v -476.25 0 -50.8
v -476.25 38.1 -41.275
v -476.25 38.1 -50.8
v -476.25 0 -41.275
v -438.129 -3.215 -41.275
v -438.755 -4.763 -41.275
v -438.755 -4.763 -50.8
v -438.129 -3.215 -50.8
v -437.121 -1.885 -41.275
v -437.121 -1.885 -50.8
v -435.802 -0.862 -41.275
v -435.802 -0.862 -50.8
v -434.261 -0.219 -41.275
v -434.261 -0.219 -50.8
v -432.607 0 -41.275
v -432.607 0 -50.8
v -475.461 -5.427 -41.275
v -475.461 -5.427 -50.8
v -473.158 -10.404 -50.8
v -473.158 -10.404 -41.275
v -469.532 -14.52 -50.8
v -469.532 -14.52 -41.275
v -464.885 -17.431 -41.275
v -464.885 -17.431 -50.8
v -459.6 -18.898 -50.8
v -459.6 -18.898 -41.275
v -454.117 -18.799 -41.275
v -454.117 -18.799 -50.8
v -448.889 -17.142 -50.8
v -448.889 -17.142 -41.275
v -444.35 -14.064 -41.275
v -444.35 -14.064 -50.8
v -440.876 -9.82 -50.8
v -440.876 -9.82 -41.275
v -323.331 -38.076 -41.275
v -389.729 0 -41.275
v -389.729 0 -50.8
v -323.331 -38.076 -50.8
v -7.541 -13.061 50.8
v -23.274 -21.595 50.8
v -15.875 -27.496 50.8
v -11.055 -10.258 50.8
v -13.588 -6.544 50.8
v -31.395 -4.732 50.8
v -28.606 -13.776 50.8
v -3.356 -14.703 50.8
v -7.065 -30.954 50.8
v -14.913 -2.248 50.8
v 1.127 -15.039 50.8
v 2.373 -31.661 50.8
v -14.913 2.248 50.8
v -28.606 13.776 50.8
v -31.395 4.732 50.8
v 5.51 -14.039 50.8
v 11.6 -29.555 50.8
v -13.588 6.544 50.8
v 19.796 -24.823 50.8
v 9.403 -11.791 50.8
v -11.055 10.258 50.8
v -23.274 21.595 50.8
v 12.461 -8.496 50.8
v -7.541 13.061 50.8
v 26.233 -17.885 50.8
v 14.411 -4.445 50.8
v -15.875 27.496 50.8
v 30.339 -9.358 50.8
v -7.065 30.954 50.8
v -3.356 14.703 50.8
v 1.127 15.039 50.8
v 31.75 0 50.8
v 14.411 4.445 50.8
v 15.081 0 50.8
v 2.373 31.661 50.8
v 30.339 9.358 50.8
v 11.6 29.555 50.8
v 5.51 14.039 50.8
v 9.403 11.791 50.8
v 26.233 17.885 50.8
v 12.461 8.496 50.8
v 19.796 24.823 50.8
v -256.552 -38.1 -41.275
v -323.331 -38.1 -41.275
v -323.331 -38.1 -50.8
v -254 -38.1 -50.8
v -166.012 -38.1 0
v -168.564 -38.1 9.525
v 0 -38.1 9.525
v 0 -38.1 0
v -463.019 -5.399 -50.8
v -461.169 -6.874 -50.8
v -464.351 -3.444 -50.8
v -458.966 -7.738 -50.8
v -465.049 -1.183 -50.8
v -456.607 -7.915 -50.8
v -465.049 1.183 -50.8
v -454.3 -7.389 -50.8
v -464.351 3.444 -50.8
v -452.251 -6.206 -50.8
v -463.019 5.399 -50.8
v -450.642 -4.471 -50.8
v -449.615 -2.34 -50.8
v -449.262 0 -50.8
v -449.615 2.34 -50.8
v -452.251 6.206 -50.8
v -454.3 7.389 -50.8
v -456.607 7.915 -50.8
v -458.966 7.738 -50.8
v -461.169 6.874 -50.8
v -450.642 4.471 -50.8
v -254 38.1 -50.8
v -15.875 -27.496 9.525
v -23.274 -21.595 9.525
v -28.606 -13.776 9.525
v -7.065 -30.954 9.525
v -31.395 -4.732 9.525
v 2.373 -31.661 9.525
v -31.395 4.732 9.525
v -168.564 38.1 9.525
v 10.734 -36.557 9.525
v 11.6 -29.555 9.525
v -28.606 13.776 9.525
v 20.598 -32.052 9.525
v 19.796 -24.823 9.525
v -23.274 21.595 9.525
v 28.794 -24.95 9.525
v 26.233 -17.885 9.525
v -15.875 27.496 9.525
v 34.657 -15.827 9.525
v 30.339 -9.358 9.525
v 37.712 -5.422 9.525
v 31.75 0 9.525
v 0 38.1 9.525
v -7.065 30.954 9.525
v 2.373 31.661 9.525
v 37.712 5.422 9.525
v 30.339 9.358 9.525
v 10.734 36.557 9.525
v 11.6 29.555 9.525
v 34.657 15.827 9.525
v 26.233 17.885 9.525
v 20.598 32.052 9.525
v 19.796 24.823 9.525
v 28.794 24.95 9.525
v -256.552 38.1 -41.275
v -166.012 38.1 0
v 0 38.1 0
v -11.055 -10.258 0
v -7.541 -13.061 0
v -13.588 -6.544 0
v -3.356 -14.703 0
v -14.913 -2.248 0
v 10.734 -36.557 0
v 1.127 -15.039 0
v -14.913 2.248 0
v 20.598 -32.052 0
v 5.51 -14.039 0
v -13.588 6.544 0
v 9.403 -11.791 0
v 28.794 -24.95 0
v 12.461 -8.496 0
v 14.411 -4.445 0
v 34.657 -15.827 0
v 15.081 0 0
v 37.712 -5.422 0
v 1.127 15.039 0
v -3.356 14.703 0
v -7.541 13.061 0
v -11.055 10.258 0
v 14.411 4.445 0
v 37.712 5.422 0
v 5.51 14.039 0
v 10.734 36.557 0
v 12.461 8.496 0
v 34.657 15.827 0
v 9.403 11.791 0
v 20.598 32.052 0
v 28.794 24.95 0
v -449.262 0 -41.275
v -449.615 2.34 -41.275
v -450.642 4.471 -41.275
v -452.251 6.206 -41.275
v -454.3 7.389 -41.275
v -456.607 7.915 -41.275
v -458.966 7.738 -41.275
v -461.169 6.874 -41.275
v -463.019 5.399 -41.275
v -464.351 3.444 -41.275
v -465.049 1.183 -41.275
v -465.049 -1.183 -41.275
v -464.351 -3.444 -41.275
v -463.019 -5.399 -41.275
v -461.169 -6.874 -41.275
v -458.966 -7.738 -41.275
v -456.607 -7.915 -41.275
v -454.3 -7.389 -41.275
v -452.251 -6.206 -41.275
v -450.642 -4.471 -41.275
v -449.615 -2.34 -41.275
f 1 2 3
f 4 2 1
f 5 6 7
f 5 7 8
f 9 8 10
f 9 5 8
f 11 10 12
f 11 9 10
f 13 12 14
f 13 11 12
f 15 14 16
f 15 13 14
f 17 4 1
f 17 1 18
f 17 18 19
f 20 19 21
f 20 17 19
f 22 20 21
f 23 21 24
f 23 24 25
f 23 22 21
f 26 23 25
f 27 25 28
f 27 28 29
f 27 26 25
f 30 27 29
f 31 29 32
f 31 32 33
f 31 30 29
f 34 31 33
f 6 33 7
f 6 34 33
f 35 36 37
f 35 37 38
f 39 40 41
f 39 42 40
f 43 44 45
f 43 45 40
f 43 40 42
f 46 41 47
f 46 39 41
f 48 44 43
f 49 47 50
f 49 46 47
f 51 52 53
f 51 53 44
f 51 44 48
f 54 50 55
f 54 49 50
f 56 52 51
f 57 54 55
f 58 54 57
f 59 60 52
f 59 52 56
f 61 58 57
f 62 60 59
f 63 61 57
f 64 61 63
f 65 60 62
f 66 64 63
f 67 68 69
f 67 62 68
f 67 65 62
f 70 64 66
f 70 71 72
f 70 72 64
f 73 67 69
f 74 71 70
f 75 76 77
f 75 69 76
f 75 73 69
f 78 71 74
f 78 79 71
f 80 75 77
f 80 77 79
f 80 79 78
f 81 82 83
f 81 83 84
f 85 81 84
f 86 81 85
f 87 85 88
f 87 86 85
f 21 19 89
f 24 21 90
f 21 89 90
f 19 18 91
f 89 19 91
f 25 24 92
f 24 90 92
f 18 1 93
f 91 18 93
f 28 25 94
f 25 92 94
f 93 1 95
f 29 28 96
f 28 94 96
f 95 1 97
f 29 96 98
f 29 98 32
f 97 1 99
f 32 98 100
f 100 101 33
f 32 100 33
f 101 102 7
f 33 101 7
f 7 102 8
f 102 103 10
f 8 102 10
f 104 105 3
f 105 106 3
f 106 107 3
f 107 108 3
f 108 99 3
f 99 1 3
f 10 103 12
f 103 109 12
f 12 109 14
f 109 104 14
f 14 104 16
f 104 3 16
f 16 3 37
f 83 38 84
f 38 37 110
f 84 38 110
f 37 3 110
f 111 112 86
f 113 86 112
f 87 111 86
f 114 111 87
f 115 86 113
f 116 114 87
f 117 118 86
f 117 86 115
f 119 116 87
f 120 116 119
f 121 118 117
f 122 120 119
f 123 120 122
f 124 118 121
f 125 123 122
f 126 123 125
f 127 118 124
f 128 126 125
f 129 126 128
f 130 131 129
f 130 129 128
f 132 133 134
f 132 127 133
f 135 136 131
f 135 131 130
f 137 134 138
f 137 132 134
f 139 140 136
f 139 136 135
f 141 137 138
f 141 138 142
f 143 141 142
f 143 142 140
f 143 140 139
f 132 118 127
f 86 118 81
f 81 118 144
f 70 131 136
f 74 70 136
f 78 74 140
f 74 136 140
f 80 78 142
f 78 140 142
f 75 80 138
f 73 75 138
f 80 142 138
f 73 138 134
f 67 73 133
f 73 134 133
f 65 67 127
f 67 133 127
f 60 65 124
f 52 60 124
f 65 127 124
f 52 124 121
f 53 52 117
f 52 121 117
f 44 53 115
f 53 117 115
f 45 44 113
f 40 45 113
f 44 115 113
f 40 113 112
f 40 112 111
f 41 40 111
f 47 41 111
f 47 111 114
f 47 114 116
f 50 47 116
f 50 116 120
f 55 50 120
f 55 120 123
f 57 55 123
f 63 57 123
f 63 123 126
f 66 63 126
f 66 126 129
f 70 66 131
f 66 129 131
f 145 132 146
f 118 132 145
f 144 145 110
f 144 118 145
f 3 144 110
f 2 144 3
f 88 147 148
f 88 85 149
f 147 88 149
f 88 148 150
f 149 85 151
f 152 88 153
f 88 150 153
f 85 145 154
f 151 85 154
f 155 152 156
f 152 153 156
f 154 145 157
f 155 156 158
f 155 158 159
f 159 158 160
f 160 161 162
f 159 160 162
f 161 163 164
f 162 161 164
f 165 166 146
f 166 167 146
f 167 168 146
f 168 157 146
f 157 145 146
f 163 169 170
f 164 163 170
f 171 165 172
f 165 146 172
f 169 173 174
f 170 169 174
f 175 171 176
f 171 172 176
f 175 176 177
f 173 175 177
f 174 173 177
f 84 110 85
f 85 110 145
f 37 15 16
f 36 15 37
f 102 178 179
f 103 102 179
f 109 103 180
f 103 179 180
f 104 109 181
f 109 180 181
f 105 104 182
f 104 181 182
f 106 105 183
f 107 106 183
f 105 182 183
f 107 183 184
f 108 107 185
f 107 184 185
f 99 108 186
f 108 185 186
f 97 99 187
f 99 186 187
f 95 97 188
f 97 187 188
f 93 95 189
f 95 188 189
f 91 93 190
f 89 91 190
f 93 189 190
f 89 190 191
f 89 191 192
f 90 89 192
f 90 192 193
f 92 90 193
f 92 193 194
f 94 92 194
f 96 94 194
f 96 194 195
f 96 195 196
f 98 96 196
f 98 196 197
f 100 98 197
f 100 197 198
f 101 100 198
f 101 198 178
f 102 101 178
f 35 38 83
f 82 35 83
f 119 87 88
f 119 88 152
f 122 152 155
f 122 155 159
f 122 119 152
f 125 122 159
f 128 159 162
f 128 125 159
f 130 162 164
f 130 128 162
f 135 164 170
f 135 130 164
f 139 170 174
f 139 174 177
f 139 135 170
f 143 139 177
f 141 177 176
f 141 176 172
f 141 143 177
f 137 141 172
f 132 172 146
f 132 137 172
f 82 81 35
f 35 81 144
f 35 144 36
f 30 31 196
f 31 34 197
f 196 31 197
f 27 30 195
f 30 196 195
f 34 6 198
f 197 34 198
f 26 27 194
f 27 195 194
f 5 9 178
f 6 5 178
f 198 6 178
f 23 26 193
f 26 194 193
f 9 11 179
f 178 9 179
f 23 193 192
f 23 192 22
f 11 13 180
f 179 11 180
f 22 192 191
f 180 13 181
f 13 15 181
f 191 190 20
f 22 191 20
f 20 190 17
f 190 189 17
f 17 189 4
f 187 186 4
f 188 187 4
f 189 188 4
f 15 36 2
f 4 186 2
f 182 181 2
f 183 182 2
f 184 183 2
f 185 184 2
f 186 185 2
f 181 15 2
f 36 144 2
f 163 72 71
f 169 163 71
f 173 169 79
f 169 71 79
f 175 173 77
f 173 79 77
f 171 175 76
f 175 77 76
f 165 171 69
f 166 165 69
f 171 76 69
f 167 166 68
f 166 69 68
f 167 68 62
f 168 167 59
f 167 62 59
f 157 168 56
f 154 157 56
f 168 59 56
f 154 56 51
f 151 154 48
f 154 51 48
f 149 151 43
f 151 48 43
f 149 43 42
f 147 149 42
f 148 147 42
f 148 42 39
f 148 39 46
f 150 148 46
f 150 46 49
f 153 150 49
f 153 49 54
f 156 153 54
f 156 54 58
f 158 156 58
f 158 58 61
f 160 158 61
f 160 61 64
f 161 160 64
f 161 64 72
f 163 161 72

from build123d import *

# Parameters (mm, degrees)
F0_R          = 7.9375
F1_DEPTH      = 9.525
F1_DEPTH_BACK = 50.8
F2_R          = 31.75
F3_DEPTH      = 41.275
F4_R          = 15.08125
F5_DEPTH      = 101.601
F7_DEPTH      = 76.201


with BuildPart() as f1:
    # F0 (on Top) → F1 (new body, two sides)
    with BuildSketch(Plane.XY) as f1_sk:
        with BuildLine():
            Line((-323.28922, -38.1), (0, -38.1))
            ThreePointArc((0, -38.1), (38.1, 0), (0, 38.1))
            Line((0, 38.1), (-476.25, 38.1))
            Line((-476.25, 38.1), (-476.25, 0))
            ThreePointArc((-476.25, 0), (-459.600382, -18.898166), (-438.754917, -4.7625))
            ThreePointArc((-438.754917, -4.7625), (-436.495121, -1.329884), (-432.606556, 0))
            Line((-432.606556, 0), (-389.728606, 0))
            Line((-389.728606, 0), (-323.331395, -38.075815))
            Line((-323.331395, -38.075815), (-323.28922, -38.1))
        make_face()
        with Locations((-457.2, 0)):
            Circle(F0_R, mode=Mode.SUBTRACT)
        Polygon((-323.331266, -38.1), (-323.28922, -38.1), (-323.331395, -38.075815), align=None)
    extrude(amount=F1_DEPTH)
    extrude(f1_sk.sketch, amount=-F1_DEPTH_BACK)

    # F2 (on face) → F3 (join)
    with BuildSketch(Plane.XY.offset(9.525)):
        Circle(F2_R)
    extrude(amount=F3_DEPTH)

    # F4 (on face) → F5 (cut, through all)
    with BuildSketch(Plane.XY.offset(50.8)):
        Circle(F4_R)
    extrude(amount=-F5_DEPTH, mode=Mode.SUBTRACT)

    # F6 (on face) → F7 (cut, through all)
    with BuildSketch(Plane(origin=(0, 38.1, 0), x_dir=(-1, 0, 0), z_dir=(0, 1, 0))):
        Polygon((-101.6, -50.8), (254, -50.8), (166.011819, 0), (-101.6, 0), align=None)
        Polygon((524.164035, 9.525), (168.564035, 9.525), (256.552216, -41.275), (524.164035, -41.275), align=None)
    extrude(amount=-F7_DEPTH, mode=Mode.SUBTRACT)


solid = f1.part
